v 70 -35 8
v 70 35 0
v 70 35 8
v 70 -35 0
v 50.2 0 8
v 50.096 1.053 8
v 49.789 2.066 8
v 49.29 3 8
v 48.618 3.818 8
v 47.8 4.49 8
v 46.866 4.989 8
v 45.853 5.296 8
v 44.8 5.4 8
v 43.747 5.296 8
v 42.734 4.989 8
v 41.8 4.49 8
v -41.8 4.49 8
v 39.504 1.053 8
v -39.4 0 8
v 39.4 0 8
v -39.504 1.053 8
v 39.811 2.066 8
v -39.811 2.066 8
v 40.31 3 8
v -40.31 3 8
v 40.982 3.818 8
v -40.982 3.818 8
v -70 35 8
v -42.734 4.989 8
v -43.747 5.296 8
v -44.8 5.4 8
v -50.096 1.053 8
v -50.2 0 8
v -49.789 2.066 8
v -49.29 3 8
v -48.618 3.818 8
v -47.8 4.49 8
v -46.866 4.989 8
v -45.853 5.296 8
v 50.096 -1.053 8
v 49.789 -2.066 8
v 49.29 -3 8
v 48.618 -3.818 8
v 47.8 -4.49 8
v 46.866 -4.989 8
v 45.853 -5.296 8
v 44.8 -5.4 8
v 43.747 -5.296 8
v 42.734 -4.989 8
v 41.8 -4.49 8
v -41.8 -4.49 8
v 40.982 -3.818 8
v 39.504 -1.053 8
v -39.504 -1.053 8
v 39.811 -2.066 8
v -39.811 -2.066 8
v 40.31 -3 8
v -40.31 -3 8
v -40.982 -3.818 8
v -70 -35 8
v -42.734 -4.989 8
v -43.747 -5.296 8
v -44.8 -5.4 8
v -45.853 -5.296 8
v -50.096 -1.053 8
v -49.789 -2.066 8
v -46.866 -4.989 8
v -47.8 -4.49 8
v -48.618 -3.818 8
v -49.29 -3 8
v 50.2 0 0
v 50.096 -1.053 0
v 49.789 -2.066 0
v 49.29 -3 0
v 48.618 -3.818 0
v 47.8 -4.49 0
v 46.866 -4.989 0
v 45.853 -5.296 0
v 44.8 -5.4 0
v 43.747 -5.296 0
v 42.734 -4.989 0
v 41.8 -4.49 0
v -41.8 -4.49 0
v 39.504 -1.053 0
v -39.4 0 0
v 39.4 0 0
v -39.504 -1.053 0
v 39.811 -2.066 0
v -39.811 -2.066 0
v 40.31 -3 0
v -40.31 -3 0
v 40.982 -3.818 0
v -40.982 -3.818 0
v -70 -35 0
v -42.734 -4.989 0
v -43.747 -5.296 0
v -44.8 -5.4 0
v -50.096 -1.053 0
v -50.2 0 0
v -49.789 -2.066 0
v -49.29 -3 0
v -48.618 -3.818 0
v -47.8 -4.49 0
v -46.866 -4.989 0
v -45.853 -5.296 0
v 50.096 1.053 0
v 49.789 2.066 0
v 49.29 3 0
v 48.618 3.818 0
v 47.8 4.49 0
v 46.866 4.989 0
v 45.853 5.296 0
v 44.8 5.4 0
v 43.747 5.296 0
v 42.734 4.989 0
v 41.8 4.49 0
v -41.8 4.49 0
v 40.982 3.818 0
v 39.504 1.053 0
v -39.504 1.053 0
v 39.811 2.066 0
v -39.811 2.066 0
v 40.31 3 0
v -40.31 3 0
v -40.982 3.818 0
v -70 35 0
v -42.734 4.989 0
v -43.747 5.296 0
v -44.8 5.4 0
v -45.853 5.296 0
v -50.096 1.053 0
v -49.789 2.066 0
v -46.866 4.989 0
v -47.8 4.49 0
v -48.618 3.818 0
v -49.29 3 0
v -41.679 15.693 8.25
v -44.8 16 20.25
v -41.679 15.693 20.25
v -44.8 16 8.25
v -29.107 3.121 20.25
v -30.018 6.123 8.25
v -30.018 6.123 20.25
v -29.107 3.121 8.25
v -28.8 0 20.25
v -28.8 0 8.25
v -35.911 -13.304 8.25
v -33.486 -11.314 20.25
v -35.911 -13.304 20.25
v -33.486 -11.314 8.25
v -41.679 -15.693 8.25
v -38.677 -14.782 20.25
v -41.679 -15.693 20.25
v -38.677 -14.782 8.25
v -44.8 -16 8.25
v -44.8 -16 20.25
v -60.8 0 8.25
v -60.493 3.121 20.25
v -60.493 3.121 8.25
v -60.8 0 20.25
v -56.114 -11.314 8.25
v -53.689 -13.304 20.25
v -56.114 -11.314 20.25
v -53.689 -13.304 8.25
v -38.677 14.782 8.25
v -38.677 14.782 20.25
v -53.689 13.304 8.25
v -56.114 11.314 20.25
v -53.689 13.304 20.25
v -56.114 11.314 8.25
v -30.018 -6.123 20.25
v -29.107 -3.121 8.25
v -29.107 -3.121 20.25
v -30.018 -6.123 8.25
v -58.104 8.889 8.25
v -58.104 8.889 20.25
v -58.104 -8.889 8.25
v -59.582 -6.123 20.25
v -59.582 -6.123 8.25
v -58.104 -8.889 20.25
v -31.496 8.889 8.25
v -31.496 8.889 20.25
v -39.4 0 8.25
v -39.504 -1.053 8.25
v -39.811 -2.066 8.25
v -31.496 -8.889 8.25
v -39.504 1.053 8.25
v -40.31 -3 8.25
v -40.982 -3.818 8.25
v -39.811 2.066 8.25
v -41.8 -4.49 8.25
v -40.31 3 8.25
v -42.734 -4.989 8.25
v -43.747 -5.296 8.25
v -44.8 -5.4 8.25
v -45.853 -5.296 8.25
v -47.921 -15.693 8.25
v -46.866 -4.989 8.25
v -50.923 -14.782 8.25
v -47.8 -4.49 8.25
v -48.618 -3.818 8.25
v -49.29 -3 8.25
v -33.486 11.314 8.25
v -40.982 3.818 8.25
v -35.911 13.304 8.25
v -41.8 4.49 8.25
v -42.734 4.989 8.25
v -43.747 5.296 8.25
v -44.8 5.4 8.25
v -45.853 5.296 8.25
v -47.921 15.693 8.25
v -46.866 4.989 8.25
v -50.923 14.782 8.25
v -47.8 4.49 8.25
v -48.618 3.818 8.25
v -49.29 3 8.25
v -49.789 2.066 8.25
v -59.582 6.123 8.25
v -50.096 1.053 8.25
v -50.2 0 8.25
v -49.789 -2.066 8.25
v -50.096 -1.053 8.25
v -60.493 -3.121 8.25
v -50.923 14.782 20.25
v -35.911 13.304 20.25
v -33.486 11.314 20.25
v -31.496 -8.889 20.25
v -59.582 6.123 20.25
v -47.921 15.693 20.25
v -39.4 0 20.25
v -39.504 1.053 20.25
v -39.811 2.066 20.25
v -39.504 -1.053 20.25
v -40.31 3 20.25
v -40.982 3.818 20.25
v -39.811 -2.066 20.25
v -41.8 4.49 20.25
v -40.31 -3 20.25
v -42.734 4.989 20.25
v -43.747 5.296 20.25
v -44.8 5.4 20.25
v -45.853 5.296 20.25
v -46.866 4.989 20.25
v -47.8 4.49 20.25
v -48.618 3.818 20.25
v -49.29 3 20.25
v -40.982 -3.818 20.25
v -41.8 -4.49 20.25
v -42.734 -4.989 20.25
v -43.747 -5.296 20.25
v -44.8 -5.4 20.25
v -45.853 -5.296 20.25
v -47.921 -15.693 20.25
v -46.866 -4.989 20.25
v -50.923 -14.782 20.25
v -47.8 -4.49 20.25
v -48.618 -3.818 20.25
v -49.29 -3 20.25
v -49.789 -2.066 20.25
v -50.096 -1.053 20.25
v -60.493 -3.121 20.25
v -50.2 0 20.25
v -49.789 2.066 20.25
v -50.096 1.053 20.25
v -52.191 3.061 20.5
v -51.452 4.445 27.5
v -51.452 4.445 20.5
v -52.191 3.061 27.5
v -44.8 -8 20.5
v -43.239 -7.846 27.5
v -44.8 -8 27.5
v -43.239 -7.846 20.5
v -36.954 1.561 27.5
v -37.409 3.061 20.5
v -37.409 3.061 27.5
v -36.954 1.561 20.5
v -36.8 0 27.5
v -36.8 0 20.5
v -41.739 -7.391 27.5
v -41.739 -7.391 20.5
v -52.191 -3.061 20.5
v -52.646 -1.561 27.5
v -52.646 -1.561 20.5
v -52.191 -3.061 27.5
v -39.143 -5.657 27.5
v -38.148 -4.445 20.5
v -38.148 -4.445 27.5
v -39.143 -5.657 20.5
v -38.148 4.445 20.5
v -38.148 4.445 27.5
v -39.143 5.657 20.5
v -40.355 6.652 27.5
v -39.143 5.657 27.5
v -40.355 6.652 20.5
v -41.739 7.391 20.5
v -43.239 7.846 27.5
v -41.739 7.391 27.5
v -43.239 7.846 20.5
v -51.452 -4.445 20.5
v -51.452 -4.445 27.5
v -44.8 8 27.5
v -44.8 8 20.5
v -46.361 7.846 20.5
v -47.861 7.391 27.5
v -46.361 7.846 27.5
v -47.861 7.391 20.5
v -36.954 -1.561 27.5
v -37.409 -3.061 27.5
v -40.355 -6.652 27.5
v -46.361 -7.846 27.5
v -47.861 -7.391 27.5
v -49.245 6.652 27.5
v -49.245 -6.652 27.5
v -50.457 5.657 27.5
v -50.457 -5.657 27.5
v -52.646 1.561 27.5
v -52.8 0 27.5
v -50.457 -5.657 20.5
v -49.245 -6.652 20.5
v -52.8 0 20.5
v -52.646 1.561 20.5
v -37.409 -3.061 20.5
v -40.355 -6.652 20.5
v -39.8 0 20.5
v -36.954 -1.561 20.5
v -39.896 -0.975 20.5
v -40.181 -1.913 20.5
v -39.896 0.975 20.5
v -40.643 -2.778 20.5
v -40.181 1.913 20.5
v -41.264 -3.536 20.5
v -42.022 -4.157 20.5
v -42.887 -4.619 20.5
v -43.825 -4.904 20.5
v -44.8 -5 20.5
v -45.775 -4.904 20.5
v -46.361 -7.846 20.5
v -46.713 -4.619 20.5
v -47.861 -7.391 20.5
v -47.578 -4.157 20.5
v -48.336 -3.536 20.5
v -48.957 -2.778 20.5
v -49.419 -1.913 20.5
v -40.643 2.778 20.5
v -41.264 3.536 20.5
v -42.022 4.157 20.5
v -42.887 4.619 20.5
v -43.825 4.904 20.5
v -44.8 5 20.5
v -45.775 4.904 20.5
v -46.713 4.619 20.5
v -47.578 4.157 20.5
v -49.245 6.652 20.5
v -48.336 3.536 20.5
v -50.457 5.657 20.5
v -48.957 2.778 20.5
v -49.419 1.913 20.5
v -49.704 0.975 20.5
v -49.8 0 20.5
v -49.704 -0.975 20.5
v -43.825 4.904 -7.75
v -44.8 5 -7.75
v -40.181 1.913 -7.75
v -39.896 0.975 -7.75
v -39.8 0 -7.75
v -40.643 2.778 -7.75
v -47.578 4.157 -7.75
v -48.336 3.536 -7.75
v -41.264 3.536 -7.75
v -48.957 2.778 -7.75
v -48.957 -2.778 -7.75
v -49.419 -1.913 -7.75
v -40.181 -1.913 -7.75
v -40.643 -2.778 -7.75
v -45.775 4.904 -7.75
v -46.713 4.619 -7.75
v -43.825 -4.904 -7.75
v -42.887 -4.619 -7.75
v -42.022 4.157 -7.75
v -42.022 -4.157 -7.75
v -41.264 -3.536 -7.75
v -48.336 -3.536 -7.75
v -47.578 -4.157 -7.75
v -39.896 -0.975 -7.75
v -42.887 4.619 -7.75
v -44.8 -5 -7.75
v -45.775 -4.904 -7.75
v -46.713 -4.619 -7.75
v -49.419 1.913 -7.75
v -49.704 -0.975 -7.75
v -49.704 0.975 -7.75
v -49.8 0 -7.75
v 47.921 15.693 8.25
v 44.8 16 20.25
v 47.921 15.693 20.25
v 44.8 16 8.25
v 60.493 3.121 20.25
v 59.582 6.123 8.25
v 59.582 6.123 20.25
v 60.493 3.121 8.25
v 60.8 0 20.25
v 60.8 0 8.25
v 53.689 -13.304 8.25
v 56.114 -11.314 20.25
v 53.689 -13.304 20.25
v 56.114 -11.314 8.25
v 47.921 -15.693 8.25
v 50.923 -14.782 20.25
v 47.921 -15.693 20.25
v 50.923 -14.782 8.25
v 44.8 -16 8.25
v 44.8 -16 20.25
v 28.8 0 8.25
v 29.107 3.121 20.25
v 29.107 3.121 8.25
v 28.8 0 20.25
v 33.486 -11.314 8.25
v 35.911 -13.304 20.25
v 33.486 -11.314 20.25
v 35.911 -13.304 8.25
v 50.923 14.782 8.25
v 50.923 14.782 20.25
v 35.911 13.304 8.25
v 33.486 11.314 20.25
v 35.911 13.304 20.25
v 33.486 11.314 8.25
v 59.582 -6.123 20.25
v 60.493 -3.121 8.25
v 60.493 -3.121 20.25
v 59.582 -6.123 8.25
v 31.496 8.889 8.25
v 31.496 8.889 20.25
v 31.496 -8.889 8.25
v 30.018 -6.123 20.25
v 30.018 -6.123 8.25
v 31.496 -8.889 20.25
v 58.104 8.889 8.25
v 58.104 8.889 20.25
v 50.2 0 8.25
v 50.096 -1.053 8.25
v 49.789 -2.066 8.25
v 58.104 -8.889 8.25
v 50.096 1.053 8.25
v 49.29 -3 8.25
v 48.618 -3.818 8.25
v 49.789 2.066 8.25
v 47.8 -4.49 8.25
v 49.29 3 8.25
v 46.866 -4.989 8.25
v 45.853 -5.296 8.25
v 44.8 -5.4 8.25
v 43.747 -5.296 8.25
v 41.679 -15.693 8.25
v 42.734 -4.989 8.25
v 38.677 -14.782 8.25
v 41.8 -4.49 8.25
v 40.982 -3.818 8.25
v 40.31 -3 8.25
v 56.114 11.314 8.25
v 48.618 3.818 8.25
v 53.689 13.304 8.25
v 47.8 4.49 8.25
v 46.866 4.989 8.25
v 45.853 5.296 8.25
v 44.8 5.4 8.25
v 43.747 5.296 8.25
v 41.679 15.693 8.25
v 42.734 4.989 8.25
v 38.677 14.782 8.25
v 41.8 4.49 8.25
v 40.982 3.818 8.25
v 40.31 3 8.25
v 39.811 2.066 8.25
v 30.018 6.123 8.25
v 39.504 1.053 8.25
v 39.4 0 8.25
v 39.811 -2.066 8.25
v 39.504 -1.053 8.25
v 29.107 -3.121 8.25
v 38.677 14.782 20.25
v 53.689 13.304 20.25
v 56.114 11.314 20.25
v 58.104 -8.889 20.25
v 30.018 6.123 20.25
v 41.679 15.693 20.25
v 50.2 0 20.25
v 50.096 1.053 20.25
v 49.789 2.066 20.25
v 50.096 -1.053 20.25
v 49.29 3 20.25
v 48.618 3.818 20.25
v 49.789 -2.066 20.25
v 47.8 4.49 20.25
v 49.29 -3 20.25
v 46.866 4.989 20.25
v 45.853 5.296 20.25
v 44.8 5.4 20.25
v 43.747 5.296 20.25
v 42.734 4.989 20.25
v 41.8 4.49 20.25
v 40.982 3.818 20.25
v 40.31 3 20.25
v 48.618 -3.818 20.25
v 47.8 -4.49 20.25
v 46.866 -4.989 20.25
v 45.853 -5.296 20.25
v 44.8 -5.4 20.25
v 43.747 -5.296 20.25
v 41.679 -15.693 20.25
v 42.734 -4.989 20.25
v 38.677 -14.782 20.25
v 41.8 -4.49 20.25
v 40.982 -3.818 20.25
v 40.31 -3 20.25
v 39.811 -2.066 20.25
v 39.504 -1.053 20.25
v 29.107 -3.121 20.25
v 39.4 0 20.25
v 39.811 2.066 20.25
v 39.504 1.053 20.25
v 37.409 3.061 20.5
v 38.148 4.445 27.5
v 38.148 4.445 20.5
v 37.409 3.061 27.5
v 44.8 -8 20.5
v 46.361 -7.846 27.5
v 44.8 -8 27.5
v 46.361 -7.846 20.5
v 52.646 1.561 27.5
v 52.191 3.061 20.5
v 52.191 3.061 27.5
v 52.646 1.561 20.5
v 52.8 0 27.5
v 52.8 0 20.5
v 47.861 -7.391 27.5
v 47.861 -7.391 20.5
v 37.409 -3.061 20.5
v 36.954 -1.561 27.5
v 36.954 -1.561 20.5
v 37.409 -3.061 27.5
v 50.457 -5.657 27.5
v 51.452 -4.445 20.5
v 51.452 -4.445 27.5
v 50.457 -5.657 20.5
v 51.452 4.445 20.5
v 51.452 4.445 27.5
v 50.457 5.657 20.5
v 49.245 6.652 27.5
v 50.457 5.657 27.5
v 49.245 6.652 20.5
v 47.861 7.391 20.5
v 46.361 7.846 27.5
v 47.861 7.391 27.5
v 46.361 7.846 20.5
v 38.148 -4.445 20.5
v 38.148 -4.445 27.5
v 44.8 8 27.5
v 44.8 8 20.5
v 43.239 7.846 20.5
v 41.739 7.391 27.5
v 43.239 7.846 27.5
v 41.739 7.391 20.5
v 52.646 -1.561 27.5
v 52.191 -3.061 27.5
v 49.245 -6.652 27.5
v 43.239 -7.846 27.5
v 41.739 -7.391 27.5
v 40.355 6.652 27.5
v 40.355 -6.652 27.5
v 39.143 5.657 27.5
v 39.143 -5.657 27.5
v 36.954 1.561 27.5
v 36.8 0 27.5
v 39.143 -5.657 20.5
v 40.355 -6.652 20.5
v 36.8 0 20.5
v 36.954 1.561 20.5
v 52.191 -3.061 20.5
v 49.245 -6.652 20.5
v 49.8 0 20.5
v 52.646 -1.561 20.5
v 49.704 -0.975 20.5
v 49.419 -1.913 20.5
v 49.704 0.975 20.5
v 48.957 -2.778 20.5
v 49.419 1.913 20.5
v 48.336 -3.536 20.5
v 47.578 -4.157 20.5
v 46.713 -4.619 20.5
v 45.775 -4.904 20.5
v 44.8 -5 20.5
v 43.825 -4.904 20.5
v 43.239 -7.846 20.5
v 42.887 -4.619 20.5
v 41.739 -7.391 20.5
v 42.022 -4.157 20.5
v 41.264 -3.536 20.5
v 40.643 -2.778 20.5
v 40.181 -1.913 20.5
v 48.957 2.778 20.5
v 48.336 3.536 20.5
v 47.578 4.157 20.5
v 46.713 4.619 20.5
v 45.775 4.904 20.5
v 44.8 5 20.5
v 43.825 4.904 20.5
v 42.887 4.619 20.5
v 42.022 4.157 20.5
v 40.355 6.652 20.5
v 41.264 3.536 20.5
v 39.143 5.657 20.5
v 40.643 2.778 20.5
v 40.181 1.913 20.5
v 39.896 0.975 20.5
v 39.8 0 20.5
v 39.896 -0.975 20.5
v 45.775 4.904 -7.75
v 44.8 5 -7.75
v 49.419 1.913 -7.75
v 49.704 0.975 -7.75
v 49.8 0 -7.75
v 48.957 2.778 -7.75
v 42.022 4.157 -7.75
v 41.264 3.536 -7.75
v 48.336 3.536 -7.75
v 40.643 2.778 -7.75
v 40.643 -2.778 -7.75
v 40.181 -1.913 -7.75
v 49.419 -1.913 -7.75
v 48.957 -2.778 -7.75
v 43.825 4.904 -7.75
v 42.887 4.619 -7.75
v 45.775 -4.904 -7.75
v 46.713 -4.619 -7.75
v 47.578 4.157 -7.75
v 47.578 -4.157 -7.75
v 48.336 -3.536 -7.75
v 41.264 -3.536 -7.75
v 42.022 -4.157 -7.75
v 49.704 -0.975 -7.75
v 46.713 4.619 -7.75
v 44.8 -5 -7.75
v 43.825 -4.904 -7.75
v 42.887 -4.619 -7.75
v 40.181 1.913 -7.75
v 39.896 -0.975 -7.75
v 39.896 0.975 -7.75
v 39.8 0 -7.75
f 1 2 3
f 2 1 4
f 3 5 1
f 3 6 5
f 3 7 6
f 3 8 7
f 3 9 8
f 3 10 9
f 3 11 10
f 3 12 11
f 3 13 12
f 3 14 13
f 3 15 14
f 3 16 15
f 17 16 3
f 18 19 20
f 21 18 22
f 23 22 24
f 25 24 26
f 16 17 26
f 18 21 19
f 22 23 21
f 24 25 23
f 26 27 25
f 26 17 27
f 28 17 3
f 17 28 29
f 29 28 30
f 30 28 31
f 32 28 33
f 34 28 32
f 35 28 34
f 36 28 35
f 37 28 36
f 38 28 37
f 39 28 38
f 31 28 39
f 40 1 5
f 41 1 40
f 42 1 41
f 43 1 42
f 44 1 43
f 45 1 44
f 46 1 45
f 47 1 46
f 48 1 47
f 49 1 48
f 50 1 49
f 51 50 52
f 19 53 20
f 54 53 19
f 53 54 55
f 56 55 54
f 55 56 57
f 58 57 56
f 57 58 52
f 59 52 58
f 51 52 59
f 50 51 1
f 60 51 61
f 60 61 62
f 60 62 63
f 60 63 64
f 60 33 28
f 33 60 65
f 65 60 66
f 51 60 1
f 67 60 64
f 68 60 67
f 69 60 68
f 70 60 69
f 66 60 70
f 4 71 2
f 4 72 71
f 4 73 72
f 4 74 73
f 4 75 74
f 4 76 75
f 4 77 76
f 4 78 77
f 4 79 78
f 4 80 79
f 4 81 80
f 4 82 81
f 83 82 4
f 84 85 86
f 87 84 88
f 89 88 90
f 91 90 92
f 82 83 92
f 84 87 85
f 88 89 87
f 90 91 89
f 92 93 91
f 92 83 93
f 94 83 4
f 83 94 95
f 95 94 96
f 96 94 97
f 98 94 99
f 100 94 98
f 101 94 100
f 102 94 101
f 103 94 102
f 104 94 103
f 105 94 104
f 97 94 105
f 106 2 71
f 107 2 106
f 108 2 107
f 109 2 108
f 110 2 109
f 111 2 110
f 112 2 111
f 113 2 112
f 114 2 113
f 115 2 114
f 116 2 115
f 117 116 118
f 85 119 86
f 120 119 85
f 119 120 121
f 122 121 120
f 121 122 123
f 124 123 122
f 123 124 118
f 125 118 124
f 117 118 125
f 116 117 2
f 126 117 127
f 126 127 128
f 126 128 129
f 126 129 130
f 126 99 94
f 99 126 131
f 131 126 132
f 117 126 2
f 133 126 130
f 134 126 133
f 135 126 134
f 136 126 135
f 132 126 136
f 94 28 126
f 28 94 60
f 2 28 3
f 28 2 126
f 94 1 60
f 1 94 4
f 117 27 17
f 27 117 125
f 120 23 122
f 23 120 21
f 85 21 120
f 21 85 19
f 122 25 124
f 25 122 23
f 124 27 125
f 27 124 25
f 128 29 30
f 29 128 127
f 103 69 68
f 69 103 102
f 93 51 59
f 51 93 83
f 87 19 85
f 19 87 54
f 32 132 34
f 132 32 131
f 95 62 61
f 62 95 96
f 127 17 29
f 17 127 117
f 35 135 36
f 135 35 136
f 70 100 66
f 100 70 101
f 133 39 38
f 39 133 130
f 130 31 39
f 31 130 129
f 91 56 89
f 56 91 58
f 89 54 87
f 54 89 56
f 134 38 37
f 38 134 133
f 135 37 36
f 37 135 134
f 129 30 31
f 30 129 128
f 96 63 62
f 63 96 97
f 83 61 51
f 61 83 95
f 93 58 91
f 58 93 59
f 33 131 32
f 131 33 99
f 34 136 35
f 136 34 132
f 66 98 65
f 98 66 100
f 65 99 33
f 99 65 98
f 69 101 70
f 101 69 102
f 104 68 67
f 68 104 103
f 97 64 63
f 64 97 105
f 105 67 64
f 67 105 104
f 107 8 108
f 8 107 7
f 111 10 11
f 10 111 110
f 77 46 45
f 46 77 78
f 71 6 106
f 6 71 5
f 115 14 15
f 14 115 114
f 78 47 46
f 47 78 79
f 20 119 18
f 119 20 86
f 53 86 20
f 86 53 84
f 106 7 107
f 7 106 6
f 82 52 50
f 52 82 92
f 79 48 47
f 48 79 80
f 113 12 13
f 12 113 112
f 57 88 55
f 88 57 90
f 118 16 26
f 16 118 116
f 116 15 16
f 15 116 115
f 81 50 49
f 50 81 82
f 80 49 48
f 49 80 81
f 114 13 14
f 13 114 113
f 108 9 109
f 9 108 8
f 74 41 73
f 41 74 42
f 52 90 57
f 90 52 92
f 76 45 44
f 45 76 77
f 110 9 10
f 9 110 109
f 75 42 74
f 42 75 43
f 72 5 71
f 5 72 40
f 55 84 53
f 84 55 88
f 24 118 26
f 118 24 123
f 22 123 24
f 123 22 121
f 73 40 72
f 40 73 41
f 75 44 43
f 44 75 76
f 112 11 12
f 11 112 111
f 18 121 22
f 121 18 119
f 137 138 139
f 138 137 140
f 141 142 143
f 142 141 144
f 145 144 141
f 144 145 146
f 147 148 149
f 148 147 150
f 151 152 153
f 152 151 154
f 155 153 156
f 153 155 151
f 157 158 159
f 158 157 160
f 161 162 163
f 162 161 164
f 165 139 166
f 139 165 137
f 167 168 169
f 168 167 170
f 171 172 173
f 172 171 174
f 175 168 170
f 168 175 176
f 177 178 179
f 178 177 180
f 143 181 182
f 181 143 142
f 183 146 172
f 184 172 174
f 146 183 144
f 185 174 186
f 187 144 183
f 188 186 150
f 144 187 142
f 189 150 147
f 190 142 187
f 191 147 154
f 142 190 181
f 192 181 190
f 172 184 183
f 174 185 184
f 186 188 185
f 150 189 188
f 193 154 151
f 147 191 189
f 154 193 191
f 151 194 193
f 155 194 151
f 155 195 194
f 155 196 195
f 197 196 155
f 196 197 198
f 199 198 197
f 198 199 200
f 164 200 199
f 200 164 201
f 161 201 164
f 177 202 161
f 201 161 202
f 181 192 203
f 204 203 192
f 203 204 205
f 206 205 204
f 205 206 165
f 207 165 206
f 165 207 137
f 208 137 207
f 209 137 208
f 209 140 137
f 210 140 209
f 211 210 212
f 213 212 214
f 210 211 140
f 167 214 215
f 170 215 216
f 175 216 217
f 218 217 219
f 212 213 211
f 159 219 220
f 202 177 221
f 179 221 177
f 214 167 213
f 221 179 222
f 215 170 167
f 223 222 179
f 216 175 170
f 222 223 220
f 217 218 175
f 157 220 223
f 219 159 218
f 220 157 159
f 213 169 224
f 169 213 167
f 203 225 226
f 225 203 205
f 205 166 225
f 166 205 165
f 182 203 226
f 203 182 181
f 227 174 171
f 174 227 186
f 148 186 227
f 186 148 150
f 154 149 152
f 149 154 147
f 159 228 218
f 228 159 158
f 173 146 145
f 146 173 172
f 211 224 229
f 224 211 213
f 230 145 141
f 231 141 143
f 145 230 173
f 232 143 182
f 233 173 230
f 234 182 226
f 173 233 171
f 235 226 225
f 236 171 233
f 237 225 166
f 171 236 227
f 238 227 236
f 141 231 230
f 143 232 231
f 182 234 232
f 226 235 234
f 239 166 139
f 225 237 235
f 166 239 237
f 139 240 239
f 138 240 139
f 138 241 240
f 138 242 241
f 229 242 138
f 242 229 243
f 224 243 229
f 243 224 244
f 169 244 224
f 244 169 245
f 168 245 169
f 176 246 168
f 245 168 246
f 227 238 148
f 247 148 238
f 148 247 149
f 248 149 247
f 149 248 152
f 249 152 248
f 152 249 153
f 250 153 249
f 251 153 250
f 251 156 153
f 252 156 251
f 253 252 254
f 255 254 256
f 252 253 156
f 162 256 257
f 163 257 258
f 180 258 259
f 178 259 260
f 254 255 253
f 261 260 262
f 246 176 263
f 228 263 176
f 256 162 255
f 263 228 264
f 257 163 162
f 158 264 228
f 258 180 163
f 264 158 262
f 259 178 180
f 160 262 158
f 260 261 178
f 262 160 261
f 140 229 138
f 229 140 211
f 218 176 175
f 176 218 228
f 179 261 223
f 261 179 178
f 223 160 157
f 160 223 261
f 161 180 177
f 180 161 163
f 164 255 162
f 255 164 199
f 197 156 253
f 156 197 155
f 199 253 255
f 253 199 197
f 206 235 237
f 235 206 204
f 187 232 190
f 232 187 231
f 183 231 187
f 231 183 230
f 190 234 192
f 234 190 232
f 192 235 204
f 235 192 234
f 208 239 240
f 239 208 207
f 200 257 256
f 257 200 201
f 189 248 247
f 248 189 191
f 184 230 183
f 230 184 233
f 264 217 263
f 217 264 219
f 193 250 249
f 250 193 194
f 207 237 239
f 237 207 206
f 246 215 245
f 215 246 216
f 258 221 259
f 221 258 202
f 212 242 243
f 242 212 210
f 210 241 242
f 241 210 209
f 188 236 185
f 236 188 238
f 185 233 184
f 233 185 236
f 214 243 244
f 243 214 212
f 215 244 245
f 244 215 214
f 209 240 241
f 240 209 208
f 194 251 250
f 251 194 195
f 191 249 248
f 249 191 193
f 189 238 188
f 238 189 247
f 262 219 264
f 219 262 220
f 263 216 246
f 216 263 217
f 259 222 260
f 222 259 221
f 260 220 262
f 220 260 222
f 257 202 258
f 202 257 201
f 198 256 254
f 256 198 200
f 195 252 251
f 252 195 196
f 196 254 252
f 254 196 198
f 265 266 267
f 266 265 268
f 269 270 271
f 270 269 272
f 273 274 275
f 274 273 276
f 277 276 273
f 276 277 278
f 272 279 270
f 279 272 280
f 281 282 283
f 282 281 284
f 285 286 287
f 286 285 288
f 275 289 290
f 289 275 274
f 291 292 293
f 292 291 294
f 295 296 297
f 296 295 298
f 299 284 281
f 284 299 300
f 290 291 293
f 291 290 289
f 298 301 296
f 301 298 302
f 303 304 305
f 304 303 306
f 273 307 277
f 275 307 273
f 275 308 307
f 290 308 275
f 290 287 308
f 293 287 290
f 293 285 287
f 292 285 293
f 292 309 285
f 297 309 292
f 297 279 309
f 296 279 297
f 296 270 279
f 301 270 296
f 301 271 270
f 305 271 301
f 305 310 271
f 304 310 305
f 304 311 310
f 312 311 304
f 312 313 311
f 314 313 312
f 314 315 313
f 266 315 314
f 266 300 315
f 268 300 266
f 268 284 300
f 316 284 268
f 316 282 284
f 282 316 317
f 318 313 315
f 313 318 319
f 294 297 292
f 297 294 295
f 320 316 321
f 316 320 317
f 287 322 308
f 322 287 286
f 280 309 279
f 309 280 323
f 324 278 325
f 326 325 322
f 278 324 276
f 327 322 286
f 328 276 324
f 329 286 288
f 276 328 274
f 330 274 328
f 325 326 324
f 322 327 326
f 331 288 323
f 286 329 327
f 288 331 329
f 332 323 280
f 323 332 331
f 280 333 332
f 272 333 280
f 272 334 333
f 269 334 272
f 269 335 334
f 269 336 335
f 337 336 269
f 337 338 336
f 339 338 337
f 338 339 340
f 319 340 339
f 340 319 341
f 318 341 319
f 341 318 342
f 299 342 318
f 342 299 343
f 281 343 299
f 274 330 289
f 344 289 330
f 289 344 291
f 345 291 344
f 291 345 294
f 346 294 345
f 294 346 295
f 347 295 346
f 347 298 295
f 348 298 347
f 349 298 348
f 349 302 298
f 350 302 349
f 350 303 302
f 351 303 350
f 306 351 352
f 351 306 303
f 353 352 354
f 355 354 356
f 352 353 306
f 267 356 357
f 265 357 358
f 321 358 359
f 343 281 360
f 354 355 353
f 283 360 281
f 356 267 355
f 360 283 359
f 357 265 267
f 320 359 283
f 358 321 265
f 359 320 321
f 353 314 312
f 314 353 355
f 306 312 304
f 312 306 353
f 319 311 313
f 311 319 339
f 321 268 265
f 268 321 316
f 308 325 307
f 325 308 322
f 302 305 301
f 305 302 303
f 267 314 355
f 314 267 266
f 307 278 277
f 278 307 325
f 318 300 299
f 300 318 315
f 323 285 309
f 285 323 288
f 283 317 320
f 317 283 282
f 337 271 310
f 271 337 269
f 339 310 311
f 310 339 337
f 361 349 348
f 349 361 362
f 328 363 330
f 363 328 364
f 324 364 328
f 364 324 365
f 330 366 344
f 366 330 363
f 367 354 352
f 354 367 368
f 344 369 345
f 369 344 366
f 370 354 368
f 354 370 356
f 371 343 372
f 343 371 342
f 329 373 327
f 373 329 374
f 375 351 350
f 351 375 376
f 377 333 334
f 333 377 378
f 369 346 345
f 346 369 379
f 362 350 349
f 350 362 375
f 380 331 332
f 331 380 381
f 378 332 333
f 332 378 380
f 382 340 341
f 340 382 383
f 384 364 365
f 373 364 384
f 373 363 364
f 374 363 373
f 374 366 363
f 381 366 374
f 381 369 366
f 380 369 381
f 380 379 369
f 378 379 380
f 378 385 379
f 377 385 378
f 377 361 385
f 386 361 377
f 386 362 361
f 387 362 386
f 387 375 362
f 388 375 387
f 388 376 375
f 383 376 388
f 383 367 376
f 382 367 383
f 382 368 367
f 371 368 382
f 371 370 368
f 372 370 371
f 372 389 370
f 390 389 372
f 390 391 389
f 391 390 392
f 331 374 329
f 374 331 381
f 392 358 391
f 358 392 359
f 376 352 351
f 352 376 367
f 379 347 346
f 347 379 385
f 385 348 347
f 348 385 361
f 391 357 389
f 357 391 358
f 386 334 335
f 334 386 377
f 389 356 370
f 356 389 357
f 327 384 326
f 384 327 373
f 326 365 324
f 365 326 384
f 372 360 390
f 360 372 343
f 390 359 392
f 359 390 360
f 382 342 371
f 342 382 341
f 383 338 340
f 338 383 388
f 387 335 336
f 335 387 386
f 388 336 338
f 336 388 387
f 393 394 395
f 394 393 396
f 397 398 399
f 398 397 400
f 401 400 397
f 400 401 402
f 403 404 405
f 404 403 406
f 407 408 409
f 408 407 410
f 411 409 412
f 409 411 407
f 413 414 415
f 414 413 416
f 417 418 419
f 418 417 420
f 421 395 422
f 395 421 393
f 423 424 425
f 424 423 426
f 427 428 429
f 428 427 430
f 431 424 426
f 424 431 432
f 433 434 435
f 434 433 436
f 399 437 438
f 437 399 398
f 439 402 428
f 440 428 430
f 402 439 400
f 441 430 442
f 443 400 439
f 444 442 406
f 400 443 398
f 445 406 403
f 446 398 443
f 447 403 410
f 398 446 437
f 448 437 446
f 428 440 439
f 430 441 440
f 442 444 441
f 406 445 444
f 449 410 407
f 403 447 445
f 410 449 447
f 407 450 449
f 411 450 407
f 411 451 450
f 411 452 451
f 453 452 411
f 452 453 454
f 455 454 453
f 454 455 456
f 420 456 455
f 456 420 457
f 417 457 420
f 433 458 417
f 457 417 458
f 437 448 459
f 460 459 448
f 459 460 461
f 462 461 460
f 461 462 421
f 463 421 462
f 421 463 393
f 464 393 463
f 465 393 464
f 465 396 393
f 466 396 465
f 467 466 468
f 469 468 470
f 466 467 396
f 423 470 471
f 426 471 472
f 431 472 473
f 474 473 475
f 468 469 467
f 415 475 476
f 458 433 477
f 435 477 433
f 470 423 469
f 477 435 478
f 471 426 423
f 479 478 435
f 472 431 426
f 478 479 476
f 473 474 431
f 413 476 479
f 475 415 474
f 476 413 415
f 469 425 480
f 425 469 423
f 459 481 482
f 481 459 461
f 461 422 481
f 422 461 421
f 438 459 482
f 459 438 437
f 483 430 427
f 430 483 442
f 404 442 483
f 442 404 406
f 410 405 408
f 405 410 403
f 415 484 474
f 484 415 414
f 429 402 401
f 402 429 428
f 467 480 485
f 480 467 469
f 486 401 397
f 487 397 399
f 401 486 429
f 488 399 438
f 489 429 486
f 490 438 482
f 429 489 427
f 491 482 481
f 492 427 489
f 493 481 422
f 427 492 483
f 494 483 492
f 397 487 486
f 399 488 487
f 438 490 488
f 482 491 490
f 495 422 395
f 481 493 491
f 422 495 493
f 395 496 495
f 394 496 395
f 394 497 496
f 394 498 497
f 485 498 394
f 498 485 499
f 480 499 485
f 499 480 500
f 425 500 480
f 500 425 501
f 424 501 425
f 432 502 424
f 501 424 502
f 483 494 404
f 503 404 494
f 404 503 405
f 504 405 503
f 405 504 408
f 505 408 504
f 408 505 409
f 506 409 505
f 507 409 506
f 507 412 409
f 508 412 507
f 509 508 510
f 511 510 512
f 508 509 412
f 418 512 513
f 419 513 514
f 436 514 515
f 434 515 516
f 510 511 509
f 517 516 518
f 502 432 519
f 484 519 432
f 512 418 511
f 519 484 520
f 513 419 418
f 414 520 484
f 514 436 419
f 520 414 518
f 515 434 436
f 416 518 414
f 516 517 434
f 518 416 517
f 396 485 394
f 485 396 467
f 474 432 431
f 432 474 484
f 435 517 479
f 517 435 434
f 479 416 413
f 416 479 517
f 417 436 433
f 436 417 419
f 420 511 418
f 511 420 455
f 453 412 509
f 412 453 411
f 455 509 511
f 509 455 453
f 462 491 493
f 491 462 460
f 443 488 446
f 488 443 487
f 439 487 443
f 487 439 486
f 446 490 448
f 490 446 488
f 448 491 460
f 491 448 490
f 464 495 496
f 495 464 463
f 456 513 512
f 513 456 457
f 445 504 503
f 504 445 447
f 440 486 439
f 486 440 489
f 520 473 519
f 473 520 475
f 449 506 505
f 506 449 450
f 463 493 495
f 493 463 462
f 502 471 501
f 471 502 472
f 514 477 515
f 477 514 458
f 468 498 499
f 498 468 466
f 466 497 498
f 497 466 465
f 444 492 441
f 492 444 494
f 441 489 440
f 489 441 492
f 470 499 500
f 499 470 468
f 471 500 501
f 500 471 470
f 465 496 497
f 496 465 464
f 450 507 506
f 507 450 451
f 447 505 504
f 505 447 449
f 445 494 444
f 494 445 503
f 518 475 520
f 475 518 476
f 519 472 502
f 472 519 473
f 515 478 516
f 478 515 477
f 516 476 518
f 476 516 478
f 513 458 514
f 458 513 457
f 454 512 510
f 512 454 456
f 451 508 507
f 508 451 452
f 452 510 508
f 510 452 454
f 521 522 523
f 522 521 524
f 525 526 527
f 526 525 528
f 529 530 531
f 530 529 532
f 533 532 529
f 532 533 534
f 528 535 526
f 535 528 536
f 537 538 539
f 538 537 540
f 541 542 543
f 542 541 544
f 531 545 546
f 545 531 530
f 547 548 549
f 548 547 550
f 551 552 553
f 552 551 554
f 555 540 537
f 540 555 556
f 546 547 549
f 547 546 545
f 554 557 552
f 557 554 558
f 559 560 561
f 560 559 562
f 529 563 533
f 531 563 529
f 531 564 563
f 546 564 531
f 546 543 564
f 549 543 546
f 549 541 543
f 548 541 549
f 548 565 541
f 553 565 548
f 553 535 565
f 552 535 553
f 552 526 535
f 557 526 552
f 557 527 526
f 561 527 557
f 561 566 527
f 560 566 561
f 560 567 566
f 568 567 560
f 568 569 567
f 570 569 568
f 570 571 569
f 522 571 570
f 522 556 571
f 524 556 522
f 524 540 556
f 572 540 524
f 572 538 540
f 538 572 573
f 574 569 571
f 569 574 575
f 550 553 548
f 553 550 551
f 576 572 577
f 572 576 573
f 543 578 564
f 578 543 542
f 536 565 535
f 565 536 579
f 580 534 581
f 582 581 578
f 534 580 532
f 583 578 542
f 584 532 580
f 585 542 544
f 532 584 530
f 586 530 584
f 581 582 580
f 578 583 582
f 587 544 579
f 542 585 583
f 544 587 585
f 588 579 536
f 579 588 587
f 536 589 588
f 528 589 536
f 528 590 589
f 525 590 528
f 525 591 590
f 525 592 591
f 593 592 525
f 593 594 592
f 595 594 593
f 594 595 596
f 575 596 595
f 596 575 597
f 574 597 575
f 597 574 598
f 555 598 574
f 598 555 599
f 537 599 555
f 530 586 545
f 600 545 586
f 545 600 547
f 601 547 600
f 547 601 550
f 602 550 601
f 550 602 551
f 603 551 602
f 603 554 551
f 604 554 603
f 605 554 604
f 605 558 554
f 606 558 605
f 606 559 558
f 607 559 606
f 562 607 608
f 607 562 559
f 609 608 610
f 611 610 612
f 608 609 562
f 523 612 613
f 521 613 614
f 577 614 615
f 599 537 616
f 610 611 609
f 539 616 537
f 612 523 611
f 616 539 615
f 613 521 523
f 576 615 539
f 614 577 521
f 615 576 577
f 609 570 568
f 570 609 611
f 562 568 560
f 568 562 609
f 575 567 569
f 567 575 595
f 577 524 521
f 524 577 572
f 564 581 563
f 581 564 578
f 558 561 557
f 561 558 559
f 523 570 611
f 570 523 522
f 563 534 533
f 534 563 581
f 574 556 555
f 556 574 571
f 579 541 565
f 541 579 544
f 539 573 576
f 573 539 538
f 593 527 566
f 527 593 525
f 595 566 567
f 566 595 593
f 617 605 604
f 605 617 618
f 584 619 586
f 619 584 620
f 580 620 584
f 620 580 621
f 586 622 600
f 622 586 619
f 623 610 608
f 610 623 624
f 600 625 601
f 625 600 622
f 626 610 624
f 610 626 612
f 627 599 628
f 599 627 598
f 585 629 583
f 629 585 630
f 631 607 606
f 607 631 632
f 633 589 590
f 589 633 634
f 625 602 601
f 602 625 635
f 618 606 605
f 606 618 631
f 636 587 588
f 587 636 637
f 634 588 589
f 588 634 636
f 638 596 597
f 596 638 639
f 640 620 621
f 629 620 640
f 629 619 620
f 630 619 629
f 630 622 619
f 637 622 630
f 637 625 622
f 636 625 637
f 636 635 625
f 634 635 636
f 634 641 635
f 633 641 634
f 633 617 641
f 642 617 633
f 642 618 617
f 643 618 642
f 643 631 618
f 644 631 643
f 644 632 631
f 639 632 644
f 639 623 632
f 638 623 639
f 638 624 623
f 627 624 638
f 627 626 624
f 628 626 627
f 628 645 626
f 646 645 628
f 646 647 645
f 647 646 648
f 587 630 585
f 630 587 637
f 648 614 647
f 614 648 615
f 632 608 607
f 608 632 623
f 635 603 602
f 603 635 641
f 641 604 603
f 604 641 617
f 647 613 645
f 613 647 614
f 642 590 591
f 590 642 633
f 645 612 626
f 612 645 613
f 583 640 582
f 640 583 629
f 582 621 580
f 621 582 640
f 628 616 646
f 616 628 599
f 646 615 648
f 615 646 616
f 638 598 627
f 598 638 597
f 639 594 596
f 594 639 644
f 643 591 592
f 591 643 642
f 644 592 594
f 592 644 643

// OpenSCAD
$fn = 32;

// ------------------------------------------------------------------------
// Standoff columns: 2 d32 standoffs, bolts d10
// Every part is its own module, assembly() places them once.
// ------------------------------------------------------------------------

// --- part 1 ---
module base_plate() {
  difference() {
    translate([-70, -35, 0]) cube([140, 70, 8]);
    translate([-44.8, 0, -1]) cylinder(h = 10, d = 10.8);
    translate([44.8, 0, -1]) cylinder(h = 10, d = 10.8);
  }
}

// --- part 2 ---
module spacer1() {
  difference() {
      translate([0, 0, 0]) cylinder(h = 12, d = 32);
      translate([0, 0, -1]) cylinder(h = 14, d = 10.8);
    }
}

// --- part 3 ---
module bolt1() {
  cylinder(h = 7, d = 16);
  translate([0, 0, -28.25]) cylinder(h = 28.25, d = 10);
}

// --- part 4 ---
module spacer2() {
  difference() {
      translate([0, 0, 0]) cylinder(h = 12, d = 32);
      translate([0, 0, -1]) cylinder(h = 14, d = 10.8);
    }
}

// --- part 5 ---
module bolt2() {
  cylinder(h = 7, d = 16);
  translate([0, 0, -28.25]) cylinder(h = 28.25, d = 10);
}

// --- assembly ---
module assembly() {
  translate([0, 0, 0]) rotate([0, 0, 0]) base_plate();
  translate([-44.8, 0, 8.25]) rotate([0, 0, 0]) spacer1();
  translate([-44.8, 0, 20.5]) rotate([0, 0, 0]) bolt1();
  translate([44.8, 0, 8.25]) rotate([0, 0, 0]) spacer2();
  translate([44.8, 0, 20.5]) rotate([0, 0, 0]) bolt2();
}

assembly();
